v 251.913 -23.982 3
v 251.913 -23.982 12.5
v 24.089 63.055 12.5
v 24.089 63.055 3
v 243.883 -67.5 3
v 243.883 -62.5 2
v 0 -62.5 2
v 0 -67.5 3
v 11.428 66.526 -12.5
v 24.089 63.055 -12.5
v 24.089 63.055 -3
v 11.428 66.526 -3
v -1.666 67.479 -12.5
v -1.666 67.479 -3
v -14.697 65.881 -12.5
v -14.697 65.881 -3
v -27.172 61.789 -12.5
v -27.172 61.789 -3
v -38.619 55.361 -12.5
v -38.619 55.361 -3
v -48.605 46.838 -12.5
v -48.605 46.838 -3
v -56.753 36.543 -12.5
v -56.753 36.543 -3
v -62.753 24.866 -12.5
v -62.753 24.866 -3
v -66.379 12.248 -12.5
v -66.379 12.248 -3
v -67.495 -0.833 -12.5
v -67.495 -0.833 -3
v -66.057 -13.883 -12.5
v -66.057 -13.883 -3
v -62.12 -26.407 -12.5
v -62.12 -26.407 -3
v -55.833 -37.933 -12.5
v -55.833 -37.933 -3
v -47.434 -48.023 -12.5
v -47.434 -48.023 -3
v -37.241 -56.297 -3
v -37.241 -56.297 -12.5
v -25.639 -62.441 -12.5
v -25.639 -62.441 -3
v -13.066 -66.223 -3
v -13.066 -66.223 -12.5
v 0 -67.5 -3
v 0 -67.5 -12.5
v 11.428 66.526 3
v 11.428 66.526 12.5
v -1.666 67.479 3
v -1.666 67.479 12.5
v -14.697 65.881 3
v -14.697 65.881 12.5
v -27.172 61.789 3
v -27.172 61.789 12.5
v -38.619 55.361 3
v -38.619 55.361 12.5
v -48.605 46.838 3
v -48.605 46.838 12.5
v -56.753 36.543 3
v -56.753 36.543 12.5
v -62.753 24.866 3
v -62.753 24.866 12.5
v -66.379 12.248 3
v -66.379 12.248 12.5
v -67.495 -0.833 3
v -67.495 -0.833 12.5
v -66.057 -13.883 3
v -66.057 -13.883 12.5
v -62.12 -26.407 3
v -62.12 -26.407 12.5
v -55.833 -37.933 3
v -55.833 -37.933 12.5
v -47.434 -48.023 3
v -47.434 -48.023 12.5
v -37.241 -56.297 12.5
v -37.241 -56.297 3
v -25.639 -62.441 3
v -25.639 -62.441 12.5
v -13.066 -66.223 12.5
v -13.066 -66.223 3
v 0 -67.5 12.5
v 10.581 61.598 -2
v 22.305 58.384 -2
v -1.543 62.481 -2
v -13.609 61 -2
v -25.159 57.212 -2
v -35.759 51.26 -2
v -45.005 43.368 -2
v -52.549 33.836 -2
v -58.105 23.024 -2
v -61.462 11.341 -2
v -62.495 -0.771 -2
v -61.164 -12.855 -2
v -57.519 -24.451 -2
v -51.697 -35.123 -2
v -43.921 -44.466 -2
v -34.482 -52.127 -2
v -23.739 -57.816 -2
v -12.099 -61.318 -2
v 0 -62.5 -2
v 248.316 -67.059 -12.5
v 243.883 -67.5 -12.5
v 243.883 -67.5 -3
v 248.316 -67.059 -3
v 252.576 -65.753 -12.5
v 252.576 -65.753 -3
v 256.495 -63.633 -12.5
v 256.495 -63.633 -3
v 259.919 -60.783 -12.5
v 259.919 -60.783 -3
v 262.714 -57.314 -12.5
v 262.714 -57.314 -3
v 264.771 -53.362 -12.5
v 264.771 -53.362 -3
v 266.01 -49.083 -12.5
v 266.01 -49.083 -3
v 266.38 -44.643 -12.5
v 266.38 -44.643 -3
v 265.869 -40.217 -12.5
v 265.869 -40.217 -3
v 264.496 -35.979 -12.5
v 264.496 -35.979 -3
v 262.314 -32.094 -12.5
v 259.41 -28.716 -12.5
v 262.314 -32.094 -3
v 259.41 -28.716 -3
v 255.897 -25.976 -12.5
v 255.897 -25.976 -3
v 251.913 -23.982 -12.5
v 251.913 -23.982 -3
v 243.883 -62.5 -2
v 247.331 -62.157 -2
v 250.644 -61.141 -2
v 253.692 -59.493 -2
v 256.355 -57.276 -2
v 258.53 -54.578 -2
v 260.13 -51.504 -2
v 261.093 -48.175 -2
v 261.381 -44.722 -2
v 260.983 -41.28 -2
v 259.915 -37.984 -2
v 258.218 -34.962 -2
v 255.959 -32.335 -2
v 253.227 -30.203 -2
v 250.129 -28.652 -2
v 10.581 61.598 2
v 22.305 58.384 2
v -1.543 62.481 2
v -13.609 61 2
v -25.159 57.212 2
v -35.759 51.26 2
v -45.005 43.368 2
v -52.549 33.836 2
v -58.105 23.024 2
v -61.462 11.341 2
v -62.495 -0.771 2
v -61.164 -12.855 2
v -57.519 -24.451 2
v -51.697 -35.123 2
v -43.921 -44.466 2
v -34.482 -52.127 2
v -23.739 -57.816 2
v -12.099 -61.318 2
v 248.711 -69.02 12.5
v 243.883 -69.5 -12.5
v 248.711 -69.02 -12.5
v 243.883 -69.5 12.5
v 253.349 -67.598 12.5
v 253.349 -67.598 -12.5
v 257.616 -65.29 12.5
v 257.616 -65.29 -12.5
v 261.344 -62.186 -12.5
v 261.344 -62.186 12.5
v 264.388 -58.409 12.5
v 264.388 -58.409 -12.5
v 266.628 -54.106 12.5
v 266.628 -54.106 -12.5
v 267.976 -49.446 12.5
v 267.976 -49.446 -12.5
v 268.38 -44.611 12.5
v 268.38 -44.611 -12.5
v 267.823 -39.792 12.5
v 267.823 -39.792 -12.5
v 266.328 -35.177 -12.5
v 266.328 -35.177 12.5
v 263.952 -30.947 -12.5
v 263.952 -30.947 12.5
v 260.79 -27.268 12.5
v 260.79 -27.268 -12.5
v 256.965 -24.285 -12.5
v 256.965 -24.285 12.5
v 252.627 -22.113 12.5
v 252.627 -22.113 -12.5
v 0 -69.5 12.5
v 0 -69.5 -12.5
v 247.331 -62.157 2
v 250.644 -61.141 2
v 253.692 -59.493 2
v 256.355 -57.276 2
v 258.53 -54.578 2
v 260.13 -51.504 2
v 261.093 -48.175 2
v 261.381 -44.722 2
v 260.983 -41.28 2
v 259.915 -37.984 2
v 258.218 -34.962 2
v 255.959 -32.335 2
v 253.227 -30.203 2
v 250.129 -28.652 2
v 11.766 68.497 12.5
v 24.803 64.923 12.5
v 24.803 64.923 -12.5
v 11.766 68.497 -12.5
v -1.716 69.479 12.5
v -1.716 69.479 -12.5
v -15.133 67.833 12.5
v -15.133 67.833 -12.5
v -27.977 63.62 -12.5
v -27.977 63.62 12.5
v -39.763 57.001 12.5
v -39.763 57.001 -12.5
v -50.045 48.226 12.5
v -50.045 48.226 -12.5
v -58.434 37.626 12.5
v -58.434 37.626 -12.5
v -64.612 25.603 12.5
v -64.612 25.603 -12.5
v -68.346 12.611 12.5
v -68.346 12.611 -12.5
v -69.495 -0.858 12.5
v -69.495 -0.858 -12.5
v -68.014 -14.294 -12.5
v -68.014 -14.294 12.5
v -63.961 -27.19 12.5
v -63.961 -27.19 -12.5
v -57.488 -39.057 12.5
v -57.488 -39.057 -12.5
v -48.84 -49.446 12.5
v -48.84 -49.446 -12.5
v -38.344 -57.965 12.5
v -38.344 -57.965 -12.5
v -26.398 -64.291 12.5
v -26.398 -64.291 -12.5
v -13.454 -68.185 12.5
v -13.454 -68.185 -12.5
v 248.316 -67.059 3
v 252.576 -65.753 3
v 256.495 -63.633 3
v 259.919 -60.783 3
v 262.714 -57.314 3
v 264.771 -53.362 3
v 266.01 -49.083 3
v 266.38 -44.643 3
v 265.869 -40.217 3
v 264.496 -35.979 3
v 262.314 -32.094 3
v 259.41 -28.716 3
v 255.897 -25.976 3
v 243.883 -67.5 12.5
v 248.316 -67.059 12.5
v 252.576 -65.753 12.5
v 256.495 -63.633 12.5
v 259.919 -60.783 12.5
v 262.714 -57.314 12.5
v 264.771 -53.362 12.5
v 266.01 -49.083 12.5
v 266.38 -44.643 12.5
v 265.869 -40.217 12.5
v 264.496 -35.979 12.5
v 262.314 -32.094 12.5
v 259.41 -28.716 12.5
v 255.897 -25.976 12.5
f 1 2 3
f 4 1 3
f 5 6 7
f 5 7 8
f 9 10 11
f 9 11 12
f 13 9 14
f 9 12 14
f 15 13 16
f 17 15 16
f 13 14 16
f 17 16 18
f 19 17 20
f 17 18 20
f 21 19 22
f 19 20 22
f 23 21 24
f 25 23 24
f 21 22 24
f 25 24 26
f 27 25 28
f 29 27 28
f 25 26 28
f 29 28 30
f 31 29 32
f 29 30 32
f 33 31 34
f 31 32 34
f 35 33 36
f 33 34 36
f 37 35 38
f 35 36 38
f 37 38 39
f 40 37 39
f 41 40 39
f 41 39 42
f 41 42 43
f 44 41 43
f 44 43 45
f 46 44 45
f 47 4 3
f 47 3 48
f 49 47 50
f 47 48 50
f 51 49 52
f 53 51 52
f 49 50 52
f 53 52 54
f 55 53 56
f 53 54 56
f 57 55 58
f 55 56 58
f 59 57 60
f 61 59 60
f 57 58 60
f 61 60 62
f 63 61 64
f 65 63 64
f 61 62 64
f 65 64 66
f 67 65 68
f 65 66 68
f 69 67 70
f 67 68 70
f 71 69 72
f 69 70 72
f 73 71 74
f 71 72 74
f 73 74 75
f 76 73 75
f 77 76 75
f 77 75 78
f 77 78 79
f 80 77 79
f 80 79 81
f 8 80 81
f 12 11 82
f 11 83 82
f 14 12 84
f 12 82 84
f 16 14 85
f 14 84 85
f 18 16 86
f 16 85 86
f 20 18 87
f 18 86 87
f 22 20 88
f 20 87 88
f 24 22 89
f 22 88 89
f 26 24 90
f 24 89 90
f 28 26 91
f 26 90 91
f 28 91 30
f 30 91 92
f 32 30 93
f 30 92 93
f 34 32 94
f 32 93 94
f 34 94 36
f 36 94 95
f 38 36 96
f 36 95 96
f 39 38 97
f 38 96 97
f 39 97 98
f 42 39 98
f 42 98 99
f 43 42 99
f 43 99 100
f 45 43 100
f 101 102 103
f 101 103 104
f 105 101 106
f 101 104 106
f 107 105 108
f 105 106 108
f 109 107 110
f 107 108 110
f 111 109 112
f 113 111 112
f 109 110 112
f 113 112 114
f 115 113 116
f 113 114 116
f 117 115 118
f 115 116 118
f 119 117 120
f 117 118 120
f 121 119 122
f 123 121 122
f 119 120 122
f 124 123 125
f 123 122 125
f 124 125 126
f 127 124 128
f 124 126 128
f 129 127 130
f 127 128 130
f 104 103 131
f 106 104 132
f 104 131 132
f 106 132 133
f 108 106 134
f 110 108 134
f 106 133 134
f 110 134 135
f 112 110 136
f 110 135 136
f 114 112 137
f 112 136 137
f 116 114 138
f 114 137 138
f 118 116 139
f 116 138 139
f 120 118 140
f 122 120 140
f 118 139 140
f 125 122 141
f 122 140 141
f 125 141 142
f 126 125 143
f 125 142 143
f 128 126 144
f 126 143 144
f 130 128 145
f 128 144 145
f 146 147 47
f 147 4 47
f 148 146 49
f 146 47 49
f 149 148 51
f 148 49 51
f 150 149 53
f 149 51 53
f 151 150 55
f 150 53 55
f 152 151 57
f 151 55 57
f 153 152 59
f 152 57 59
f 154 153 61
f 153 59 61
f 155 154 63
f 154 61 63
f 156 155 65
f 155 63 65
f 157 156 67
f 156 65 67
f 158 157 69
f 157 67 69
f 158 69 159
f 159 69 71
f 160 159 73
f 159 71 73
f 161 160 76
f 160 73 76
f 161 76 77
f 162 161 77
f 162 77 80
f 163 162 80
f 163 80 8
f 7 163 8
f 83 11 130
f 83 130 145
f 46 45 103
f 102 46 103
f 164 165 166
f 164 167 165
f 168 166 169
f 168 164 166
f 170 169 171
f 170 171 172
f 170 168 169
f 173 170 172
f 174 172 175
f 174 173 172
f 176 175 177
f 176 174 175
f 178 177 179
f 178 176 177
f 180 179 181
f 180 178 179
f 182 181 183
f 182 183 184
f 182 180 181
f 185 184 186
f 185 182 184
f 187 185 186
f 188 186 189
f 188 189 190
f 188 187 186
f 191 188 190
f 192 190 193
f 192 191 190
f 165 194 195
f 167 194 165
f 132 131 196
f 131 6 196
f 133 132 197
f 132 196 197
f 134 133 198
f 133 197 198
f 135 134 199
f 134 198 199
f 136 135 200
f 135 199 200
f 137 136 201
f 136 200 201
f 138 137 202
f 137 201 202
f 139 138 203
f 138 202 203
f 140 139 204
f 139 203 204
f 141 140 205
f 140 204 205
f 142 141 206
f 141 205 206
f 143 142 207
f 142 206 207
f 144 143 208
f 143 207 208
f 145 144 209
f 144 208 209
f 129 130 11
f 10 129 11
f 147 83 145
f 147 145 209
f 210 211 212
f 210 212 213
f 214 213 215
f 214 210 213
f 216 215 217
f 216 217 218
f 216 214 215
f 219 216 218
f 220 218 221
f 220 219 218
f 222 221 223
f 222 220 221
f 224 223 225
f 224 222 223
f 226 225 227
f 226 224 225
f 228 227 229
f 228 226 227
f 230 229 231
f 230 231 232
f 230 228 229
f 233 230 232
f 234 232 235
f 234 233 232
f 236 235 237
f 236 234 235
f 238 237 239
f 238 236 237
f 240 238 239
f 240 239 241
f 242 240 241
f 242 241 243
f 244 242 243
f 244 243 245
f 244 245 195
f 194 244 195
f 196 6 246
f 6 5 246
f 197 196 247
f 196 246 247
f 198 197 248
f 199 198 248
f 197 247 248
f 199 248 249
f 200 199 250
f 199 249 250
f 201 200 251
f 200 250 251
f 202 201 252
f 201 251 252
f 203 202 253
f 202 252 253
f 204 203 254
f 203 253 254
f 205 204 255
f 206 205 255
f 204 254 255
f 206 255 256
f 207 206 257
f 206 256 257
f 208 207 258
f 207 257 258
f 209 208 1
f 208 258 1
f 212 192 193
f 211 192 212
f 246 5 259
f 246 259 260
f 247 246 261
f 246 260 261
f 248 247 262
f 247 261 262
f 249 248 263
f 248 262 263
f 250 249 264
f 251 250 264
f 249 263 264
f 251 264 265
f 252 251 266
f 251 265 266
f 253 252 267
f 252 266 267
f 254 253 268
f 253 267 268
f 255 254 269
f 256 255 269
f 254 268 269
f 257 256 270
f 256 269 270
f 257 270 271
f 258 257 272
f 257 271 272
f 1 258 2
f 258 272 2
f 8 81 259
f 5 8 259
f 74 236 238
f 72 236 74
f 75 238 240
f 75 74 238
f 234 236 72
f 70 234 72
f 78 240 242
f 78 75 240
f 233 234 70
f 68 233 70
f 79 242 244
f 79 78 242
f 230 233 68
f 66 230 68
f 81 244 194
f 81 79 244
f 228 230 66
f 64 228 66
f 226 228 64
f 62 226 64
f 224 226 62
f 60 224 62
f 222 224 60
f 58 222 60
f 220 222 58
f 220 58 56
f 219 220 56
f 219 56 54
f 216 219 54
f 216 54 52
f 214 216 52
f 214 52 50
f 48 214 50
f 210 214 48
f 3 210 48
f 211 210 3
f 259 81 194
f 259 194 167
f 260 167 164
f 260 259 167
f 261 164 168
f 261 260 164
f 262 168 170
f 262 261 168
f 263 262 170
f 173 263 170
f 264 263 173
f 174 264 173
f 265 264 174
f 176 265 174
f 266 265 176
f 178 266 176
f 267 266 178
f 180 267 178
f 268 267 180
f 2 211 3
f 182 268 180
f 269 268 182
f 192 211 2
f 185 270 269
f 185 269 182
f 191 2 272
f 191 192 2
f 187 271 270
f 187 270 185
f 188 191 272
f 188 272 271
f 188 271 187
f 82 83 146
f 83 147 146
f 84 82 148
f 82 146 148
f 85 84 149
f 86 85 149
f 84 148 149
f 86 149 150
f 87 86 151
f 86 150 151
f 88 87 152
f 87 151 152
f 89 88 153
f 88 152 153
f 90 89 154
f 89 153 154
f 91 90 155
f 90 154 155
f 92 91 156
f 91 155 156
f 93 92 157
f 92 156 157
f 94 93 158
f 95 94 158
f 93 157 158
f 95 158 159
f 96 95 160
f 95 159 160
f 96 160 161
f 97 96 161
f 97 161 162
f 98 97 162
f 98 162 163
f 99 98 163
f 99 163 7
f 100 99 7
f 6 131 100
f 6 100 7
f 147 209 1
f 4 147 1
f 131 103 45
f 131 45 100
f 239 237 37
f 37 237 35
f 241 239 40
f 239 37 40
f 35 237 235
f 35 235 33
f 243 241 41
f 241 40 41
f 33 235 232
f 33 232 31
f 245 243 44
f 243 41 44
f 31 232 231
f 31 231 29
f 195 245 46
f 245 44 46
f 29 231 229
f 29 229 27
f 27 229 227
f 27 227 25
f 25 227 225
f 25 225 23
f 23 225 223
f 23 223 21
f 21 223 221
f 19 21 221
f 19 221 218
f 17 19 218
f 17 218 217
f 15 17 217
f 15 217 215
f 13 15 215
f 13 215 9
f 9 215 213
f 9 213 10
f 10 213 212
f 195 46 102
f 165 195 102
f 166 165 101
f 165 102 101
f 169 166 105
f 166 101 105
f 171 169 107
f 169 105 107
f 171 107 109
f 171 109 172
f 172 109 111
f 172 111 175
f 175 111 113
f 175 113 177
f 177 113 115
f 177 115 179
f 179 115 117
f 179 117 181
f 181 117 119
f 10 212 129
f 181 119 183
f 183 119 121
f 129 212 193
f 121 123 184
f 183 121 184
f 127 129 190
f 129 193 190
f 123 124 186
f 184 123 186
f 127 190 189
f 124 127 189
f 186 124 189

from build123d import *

# Parameters (mm, degrees)
EXTRUDE_THIN1_DEPTH = 12.5


with BuildPart() as part:
    # Sketch1 → Extrude-Thin1 (new, symmetric)
    with BuildSketch(Plane.XY):
        with BuildLine():
            Line((252.626703921, -22.113309703), (24.803089564, 64.923468392))
            ThreePointArc((24.803089564, 64.923468392), (-68.346291243, 12.610887097), (0, -69.5))
            Line((0, -69.5), (243.883168751, -69.5))
            ThreePointArc((243.883168751, -69.5), (267.976465664, -49.445564516), (252.626703921, -22.113309703))
        make_face()
        with BuildLine():
            Line((251.912945948, -23.981610952), (24.089331591, 63.055167144))
            ThreePointArc((24.089331591, 63.055167144), (-66.379491495, 12.247983871), (0, -67.5))
            Line((0, -67.5), (243.883168751, -67.5))
            ThreePointArc((243.883168751, -67.5), (266.009665916, -49.08266129), (251.912945948, -23.981610952))
        make_face(mode=Mode.SUBTRACT)
    extrude(amount=EXTRUDE_THIN1_DEPTH, both=True)

    # Sweep1: sweep along a path in Sketch1<3>
    with BuildLine(Plane.XY) as sweep1_path:
        Line((0, -67.5), (243.883168751, -67.5))
        ThreePointArc((243.883168751, -67.5), (266.009665916, -49.08266129), (251.912945948, -23.981610952))
        Line((251.912945948, -23.981610952), (24.089331591, 63.055167144))
        ThreePointArc((24.089331591, 63.055167144), (-66.379491495, 12.247983871), (0, -67.5))
    # Sketch2 → Sweep1 (sweep)
    with BuildSketch(Plane(origin=(0, 0, 0), x_dir=(0, 0, -1), z_dir=(1, 0, 0))):
        Polygon((-3, -67.5), (-2, -62.5), (2, -62.5), (3, -67.5), align=None)
    sweep(path=sweep1_path.line)


solid = part.part
